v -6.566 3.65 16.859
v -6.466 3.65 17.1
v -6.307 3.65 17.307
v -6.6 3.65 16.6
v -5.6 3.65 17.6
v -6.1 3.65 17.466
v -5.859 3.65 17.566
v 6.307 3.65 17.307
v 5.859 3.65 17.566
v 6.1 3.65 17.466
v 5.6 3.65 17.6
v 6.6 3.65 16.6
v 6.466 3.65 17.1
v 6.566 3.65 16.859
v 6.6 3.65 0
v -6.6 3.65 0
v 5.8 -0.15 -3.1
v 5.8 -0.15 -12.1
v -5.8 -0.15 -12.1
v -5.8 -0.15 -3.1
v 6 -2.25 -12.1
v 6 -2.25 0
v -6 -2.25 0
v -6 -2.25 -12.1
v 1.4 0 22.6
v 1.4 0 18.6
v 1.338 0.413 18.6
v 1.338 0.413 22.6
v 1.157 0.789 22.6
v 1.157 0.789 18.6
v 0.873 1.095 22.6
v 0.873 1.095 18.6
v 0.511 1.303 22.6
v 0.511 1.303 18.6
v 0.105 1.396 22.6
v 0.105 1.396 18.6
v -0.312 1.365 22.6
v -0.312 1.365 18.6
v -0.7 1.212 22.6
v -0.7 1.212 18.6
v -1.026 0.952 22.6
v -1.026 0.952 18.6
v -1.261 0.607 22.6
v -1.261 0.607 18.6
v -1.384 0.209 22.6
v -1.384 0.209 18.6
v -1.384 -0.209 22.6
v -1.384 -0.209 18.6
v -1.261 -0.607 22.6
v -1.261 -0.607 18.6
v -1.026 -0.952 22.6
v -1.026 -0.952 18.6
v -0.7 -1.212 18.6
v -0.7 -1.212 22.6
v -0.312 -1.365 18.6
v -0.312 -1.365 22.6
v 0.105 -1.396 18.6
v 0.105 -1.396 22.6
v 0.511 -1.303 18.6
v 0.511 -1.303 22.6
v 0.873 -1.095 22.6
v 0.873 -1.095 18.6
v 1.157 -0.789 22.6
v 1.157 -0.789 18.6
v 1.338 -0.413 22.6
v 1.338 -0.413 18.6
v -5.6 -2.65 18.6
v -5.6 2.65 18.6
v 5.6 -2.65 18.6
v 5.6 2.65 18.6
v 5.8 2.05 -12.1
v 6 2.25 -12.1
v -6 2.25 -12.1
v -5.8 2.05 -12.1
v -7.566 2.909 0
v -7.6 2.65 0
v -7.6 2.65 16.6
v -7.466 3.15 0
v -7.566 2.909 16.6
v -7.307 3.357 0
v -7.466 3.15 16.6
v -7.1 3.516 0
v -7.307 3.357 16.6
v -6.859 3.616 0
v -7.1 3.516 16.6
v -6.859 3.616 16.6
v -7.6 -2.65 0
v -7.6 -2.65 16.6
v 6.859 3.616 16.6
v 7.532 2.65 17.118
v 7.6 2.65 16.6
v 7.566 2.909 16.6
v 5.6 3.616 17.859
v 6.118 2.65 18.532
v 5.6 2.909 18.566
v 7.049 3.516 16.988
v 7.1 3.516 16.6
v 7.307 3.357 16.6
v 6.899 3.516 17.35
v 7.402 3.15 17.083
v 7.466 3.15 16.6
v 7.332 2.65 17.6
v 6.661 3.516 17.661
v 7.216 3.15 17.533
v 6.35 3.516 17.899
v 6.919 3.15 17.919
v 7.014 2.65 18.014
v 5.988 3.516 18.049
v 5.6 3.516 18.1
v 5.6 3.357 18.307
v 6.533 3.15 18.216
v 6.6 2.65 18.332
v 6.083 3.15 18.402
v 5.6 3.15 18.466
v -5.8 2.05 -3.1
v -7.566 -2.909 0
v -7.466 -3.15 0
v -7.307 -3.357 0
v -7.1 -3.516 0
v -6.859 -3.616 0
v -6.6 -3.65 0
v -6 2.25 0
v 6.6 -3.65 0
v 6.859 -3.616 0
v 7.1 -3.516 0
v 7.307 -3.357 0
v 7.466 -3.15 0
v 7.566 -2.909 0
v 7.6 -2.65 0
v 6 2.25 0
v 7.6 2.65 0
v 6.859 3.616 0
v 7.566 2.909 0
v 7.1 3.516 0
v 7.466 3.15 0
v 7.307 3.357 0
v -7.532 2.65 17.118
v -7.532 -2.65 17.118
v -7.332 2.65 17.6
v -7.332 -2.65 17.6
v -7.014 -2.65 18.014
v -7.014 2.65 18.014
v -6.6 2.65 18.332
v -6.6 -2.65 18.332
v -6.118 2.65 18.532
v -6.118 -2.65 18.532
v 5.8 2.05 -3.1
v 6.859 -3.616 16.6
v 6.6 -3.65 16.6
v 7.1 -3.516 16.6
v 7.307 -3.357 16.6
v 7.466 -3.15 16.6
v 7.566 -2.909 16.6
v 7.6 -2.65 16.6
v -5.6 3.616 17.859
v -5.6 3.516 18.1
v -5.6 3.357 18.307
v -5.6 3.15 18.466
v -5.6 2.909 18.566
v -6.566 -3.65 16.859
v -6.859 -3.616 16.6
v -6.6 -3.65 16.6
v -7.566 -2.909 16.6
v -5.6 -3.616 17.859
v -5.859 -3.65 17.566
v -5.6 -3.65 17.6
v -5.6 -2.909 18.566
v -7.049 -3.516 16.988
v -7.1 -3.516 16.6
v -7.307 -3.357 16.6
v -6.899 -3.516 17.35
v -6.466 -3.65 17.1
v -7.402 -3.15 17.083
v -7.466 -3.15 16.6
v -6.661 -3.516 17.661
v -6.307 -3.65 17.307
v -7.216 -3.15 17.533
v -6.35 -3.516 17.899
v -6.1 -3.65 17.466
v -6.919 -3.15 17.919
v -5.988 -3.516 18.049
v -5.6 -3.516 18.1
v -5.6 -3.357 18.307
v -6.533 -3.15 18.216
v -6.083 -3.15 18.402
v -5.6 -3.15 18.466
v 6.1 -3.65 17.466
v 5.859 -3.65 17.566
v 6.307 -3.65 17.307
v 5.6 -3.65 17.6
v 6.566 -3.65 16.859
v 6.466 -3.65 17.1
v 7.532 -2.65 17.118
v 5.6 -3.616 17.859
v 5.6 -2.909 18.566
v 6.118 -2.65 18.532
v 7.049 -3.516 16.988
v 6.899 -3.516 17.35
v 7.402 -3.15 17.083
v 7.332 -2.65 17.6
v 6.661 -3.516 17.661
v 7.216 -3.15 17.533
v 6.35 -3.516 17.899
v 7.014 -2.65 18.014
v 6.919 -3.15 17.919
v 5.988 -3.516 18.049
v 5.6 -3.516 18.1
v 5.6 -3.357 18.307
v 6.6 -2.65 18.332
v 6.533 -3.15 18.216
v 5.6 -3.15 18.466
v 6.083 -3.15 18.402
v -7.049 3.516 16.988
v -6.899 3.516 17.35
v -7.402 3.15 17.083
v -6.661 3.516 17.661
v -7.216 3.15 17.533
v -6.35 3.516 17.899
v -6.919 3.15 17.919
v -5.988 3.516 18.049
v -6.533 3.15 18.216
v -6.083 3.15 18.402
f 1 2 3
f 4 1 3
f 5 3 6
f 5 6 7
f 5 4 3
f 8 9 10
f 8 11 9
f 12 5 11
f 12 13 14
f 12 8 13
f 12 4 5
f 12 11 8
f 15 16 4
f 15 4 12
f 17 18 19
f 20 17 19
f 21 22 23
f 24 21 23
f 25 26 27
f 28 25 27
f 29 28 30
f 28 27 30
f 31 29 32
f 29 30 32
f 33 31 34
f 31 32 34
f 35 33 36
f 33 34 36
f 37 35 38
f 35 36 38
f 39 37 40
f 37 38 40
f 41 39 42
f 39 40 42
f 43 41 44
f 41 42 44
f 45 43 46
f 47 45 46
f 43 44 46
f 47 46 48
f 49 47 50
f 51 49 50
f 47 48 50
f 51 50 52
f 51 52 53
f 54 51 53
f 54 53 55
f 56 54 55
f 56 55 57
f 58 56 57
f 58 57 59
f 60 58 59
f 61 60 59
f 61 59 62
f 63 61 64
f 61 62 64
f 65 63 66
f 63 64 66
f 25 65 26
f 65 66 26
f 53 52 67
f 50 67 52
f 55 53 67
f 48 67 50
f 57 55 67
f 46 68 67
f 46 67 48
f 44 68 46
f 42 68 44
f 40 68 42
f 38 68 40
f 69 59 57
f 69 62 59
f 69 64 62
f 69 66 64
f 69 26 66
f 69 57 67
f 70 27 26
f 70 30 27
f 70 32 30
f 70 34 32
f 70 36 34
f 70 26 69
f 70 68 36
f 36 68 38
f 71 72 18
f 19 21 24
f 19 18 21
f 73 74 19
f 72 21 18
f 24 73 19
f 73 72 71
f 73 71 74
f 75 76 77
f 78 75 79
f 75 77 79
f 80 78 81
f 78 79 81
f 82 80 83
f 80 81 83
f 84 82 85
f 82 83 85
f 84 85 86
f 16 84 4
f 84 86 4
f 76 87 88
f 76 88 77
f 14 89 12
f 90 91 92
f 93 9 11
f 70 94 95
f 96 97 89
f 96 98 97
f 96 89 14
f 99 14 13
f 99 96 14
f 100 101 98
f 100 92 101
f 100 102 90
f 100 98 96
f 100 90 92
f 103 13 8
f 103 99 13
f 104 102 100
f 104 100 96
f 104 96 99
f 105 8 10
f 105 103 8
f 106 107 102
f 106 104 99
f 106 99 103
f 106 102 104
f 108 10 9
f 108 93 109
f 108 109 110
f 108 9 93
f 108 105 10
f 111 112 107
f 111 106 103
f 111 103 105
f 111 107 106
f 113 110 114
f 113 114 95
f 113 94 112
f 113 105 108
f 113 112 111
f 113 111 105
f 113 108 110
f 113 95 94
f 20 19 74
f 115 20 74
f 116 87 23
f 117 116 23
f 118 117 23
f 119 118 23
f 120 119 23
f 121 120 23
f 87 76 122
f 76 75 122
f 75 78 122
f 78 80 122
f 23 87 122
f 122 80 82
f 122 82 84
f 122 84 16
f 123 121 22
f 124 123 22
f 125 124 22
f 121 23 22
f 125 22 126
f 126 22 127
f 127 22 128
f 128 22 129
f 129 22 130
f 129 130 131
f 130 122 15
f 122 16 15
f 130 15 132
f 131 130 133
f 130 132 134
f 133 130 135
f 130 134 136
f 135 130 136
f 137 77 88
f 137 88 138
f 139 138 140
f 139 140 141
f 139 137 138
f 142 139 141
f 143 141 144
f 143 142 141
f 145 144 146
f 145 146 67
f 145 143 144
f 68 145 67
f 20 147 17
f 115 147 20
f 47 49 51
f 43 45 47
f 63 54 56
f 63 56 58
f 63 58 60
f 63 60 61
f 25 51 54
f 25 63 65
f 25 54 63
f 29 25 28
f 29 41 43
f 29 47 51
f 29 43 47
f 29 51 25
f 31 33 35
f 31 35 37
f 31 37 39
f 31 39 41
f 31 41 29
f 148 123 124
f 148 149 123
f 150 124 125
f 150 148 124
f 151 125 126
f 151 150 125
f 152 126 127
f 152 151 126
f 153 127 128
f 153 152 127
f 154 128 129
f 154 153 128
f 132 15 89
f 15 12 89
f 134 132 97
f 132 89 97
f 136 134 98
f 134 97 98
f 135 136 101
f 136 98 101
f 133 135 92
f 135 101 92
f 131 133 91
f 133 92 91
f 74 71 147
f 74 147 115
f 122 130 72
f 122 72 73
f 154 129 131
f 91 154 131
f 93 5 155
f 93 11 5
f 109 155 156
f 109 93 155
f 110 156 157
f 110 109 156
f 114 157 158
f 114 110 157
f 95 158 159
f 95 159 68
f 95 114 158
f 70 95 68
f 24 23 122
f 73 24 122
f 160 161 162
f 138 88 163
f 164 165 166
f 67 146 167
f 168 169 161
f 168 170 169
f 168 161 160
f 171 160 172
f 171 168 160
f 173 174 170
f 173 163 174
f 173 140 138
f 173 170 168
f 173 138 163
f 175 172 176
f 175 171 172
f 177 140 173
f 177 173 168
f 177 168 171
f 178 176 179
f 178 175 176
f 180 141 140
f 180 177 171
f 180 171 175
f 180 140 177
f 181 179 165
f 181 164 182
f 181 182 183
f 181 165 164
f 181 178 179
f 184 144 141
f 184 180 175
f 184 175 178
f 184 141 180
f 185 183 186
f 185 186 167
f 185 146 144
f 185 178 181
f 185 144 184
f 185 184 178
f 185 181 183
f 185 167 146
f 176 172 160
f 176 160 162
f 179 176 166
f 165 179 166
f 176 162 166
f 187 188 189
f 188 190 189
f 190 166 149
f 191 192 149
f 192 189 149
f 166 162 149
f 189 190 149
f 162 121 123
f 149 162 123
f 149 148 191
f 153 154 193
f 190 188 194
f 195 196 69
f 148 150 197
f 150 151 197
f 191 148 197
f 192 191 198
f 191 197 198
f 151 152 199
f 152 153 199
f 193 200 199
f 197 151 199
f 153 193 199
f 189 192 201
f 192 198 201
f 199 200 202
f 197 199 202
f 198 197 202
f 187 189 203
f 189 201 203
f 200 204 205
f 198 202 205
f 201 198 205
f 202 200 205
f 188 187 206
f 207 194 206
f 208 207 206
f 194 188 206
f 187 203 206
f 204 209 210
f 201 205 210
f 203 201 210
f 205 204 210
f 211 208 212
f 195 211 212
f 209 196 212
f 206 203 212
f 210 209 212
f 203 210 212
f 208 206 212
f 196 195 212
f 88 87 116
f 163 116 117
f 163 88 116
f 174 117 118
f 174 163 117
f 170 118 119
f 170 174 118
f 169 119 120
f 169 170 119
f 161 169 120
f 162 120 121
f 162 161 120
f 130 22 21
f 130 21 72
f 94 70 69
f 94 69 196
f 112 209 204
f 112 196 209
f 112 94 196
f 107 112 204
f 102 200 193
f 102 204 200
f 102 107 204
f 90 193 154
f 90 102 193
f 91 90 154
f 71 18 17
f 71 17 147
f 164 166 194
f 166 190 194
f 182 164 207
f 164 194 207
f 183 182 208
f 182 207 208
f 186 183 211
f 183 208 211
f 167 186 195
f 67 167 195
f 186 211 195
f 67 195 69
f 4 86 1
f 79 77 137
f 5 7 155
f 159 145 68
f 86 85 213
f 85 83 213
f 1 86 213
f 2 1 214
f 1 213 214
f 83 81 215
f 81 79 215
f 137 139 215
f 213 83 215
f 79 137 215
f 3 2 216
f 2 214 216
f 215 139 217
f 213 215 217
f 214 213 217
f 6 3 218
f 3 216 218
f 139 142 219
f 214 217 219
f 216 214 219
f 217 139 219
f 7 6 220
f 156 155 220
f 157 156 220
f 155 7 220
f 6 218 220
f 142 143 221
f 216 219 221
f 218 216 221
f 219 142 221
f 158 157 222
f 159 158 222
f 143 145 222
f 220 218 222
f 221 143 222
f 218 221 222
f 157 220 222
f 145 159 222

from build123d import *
from OCP.BRepFilletAPI import BRepFilletAPI_MakeFillet

# Parameters (mm, degrees)
ESQUISSE1_W             = 15.2
ESQUISSE1_H             = 7.3
BOSS_EXTRU_1_DEPTH      = 18.6
ESQUISSE2_W             = 12
ESQUISSE2_H             = 4.5
BOSS_EXTRU_2_DEPTH      = 12.1
ESQUISSE3_W             = 11.6
ESQUISSE3_H             = 2.2
ENL_V_MAT_EXTRU_1_DEPTH = 9
ESQUISSE4_R             = 1.4
BOSS_EXTRU_3_DEPTH      = 4
CONG_1_R1               = 1
CONG_1_R2               = 2


with BuildPart() as part:
    # Esquisse1 → Boss.-Extru.1 (new body)
    with BuildSketch(Plane.XY):
        Rectangle(ESQUISSE1_W, ESQUISSE1_H)
    extrude(amount=BOSS_EXTRU_1_DEPTH)

    # Esquisse2 → Boss.-Extru.2 (add)
    with BuildSketch(Plane(origin=(0, 0, 0), x_dir=(-1, 0, 0), z_dir=(0, 0, -1))):
        Rectangle(ESQUISSE2_W, ESQUISSE2_H)
    extrude(amount=BOSS_EXTRU_2_DEPTH)

    # Esquisse3 → Enlèv. mat.-Extru.1 (cut)
    with BuildSketch(Plane(origin=(0, 0, -12.1), x_dir=(-1, 0, 0), z_dir=(0, 0, -1))):
        with Locations((0, 0.95)):
            Rectangle(ESQUISSE3_W, ESQUISSE3_H)
    extrude(amount=-ENL_V_MAT_EXTRU_1_DEPTH, mode=Mode.SUBTRACT)

    # Esquisse4 → Boss.-Extru.3 (add)
    with BuildSketch(Plane.XY.offset(18.6)):
        Circle(ESQUISSE4_R)
    extrude(amount=BOSS_EXTRU_3_DEPTH)

    # Congé1: one fillet with a radius per group of edges: ONE call of the kernel's fillet builder (fillet() takes one radius for all edges)
    cong_1_edges_1 = [part.edges().sort_by_distance(p)[0] for p in [
        (-7.6, 3.65, 9.3),
        (7.6, 3.65, 9.3),
        (7.6, -3.65, 9.3),
        (-7.6, -3.65, 9.3),
        (0, -3.65, 18.6),
        (0, 3.65, 18.6),
    ]]
    cong_1_edges_2 = [part.edges().sort_by_distance(p)[0] for p in [
        (-7.6, 0, 18.6),
        (7.6, 0, 18.6),
    ]]
    cong_1 = BRepFilletAPI_MakeFillet(part.part.solid().wrapped)
    for e in cong_1_edges_1:
        cong_1.Add(CONG_1_R1, e.wrapped)
    for e in cong_1_edges_2:
        cong_1.Add(CONG_1_R2, e.wrapped)
    add(Compound.cast(cong_1.Shape()), mode=Mode.REPLACE)


solid = part.part
